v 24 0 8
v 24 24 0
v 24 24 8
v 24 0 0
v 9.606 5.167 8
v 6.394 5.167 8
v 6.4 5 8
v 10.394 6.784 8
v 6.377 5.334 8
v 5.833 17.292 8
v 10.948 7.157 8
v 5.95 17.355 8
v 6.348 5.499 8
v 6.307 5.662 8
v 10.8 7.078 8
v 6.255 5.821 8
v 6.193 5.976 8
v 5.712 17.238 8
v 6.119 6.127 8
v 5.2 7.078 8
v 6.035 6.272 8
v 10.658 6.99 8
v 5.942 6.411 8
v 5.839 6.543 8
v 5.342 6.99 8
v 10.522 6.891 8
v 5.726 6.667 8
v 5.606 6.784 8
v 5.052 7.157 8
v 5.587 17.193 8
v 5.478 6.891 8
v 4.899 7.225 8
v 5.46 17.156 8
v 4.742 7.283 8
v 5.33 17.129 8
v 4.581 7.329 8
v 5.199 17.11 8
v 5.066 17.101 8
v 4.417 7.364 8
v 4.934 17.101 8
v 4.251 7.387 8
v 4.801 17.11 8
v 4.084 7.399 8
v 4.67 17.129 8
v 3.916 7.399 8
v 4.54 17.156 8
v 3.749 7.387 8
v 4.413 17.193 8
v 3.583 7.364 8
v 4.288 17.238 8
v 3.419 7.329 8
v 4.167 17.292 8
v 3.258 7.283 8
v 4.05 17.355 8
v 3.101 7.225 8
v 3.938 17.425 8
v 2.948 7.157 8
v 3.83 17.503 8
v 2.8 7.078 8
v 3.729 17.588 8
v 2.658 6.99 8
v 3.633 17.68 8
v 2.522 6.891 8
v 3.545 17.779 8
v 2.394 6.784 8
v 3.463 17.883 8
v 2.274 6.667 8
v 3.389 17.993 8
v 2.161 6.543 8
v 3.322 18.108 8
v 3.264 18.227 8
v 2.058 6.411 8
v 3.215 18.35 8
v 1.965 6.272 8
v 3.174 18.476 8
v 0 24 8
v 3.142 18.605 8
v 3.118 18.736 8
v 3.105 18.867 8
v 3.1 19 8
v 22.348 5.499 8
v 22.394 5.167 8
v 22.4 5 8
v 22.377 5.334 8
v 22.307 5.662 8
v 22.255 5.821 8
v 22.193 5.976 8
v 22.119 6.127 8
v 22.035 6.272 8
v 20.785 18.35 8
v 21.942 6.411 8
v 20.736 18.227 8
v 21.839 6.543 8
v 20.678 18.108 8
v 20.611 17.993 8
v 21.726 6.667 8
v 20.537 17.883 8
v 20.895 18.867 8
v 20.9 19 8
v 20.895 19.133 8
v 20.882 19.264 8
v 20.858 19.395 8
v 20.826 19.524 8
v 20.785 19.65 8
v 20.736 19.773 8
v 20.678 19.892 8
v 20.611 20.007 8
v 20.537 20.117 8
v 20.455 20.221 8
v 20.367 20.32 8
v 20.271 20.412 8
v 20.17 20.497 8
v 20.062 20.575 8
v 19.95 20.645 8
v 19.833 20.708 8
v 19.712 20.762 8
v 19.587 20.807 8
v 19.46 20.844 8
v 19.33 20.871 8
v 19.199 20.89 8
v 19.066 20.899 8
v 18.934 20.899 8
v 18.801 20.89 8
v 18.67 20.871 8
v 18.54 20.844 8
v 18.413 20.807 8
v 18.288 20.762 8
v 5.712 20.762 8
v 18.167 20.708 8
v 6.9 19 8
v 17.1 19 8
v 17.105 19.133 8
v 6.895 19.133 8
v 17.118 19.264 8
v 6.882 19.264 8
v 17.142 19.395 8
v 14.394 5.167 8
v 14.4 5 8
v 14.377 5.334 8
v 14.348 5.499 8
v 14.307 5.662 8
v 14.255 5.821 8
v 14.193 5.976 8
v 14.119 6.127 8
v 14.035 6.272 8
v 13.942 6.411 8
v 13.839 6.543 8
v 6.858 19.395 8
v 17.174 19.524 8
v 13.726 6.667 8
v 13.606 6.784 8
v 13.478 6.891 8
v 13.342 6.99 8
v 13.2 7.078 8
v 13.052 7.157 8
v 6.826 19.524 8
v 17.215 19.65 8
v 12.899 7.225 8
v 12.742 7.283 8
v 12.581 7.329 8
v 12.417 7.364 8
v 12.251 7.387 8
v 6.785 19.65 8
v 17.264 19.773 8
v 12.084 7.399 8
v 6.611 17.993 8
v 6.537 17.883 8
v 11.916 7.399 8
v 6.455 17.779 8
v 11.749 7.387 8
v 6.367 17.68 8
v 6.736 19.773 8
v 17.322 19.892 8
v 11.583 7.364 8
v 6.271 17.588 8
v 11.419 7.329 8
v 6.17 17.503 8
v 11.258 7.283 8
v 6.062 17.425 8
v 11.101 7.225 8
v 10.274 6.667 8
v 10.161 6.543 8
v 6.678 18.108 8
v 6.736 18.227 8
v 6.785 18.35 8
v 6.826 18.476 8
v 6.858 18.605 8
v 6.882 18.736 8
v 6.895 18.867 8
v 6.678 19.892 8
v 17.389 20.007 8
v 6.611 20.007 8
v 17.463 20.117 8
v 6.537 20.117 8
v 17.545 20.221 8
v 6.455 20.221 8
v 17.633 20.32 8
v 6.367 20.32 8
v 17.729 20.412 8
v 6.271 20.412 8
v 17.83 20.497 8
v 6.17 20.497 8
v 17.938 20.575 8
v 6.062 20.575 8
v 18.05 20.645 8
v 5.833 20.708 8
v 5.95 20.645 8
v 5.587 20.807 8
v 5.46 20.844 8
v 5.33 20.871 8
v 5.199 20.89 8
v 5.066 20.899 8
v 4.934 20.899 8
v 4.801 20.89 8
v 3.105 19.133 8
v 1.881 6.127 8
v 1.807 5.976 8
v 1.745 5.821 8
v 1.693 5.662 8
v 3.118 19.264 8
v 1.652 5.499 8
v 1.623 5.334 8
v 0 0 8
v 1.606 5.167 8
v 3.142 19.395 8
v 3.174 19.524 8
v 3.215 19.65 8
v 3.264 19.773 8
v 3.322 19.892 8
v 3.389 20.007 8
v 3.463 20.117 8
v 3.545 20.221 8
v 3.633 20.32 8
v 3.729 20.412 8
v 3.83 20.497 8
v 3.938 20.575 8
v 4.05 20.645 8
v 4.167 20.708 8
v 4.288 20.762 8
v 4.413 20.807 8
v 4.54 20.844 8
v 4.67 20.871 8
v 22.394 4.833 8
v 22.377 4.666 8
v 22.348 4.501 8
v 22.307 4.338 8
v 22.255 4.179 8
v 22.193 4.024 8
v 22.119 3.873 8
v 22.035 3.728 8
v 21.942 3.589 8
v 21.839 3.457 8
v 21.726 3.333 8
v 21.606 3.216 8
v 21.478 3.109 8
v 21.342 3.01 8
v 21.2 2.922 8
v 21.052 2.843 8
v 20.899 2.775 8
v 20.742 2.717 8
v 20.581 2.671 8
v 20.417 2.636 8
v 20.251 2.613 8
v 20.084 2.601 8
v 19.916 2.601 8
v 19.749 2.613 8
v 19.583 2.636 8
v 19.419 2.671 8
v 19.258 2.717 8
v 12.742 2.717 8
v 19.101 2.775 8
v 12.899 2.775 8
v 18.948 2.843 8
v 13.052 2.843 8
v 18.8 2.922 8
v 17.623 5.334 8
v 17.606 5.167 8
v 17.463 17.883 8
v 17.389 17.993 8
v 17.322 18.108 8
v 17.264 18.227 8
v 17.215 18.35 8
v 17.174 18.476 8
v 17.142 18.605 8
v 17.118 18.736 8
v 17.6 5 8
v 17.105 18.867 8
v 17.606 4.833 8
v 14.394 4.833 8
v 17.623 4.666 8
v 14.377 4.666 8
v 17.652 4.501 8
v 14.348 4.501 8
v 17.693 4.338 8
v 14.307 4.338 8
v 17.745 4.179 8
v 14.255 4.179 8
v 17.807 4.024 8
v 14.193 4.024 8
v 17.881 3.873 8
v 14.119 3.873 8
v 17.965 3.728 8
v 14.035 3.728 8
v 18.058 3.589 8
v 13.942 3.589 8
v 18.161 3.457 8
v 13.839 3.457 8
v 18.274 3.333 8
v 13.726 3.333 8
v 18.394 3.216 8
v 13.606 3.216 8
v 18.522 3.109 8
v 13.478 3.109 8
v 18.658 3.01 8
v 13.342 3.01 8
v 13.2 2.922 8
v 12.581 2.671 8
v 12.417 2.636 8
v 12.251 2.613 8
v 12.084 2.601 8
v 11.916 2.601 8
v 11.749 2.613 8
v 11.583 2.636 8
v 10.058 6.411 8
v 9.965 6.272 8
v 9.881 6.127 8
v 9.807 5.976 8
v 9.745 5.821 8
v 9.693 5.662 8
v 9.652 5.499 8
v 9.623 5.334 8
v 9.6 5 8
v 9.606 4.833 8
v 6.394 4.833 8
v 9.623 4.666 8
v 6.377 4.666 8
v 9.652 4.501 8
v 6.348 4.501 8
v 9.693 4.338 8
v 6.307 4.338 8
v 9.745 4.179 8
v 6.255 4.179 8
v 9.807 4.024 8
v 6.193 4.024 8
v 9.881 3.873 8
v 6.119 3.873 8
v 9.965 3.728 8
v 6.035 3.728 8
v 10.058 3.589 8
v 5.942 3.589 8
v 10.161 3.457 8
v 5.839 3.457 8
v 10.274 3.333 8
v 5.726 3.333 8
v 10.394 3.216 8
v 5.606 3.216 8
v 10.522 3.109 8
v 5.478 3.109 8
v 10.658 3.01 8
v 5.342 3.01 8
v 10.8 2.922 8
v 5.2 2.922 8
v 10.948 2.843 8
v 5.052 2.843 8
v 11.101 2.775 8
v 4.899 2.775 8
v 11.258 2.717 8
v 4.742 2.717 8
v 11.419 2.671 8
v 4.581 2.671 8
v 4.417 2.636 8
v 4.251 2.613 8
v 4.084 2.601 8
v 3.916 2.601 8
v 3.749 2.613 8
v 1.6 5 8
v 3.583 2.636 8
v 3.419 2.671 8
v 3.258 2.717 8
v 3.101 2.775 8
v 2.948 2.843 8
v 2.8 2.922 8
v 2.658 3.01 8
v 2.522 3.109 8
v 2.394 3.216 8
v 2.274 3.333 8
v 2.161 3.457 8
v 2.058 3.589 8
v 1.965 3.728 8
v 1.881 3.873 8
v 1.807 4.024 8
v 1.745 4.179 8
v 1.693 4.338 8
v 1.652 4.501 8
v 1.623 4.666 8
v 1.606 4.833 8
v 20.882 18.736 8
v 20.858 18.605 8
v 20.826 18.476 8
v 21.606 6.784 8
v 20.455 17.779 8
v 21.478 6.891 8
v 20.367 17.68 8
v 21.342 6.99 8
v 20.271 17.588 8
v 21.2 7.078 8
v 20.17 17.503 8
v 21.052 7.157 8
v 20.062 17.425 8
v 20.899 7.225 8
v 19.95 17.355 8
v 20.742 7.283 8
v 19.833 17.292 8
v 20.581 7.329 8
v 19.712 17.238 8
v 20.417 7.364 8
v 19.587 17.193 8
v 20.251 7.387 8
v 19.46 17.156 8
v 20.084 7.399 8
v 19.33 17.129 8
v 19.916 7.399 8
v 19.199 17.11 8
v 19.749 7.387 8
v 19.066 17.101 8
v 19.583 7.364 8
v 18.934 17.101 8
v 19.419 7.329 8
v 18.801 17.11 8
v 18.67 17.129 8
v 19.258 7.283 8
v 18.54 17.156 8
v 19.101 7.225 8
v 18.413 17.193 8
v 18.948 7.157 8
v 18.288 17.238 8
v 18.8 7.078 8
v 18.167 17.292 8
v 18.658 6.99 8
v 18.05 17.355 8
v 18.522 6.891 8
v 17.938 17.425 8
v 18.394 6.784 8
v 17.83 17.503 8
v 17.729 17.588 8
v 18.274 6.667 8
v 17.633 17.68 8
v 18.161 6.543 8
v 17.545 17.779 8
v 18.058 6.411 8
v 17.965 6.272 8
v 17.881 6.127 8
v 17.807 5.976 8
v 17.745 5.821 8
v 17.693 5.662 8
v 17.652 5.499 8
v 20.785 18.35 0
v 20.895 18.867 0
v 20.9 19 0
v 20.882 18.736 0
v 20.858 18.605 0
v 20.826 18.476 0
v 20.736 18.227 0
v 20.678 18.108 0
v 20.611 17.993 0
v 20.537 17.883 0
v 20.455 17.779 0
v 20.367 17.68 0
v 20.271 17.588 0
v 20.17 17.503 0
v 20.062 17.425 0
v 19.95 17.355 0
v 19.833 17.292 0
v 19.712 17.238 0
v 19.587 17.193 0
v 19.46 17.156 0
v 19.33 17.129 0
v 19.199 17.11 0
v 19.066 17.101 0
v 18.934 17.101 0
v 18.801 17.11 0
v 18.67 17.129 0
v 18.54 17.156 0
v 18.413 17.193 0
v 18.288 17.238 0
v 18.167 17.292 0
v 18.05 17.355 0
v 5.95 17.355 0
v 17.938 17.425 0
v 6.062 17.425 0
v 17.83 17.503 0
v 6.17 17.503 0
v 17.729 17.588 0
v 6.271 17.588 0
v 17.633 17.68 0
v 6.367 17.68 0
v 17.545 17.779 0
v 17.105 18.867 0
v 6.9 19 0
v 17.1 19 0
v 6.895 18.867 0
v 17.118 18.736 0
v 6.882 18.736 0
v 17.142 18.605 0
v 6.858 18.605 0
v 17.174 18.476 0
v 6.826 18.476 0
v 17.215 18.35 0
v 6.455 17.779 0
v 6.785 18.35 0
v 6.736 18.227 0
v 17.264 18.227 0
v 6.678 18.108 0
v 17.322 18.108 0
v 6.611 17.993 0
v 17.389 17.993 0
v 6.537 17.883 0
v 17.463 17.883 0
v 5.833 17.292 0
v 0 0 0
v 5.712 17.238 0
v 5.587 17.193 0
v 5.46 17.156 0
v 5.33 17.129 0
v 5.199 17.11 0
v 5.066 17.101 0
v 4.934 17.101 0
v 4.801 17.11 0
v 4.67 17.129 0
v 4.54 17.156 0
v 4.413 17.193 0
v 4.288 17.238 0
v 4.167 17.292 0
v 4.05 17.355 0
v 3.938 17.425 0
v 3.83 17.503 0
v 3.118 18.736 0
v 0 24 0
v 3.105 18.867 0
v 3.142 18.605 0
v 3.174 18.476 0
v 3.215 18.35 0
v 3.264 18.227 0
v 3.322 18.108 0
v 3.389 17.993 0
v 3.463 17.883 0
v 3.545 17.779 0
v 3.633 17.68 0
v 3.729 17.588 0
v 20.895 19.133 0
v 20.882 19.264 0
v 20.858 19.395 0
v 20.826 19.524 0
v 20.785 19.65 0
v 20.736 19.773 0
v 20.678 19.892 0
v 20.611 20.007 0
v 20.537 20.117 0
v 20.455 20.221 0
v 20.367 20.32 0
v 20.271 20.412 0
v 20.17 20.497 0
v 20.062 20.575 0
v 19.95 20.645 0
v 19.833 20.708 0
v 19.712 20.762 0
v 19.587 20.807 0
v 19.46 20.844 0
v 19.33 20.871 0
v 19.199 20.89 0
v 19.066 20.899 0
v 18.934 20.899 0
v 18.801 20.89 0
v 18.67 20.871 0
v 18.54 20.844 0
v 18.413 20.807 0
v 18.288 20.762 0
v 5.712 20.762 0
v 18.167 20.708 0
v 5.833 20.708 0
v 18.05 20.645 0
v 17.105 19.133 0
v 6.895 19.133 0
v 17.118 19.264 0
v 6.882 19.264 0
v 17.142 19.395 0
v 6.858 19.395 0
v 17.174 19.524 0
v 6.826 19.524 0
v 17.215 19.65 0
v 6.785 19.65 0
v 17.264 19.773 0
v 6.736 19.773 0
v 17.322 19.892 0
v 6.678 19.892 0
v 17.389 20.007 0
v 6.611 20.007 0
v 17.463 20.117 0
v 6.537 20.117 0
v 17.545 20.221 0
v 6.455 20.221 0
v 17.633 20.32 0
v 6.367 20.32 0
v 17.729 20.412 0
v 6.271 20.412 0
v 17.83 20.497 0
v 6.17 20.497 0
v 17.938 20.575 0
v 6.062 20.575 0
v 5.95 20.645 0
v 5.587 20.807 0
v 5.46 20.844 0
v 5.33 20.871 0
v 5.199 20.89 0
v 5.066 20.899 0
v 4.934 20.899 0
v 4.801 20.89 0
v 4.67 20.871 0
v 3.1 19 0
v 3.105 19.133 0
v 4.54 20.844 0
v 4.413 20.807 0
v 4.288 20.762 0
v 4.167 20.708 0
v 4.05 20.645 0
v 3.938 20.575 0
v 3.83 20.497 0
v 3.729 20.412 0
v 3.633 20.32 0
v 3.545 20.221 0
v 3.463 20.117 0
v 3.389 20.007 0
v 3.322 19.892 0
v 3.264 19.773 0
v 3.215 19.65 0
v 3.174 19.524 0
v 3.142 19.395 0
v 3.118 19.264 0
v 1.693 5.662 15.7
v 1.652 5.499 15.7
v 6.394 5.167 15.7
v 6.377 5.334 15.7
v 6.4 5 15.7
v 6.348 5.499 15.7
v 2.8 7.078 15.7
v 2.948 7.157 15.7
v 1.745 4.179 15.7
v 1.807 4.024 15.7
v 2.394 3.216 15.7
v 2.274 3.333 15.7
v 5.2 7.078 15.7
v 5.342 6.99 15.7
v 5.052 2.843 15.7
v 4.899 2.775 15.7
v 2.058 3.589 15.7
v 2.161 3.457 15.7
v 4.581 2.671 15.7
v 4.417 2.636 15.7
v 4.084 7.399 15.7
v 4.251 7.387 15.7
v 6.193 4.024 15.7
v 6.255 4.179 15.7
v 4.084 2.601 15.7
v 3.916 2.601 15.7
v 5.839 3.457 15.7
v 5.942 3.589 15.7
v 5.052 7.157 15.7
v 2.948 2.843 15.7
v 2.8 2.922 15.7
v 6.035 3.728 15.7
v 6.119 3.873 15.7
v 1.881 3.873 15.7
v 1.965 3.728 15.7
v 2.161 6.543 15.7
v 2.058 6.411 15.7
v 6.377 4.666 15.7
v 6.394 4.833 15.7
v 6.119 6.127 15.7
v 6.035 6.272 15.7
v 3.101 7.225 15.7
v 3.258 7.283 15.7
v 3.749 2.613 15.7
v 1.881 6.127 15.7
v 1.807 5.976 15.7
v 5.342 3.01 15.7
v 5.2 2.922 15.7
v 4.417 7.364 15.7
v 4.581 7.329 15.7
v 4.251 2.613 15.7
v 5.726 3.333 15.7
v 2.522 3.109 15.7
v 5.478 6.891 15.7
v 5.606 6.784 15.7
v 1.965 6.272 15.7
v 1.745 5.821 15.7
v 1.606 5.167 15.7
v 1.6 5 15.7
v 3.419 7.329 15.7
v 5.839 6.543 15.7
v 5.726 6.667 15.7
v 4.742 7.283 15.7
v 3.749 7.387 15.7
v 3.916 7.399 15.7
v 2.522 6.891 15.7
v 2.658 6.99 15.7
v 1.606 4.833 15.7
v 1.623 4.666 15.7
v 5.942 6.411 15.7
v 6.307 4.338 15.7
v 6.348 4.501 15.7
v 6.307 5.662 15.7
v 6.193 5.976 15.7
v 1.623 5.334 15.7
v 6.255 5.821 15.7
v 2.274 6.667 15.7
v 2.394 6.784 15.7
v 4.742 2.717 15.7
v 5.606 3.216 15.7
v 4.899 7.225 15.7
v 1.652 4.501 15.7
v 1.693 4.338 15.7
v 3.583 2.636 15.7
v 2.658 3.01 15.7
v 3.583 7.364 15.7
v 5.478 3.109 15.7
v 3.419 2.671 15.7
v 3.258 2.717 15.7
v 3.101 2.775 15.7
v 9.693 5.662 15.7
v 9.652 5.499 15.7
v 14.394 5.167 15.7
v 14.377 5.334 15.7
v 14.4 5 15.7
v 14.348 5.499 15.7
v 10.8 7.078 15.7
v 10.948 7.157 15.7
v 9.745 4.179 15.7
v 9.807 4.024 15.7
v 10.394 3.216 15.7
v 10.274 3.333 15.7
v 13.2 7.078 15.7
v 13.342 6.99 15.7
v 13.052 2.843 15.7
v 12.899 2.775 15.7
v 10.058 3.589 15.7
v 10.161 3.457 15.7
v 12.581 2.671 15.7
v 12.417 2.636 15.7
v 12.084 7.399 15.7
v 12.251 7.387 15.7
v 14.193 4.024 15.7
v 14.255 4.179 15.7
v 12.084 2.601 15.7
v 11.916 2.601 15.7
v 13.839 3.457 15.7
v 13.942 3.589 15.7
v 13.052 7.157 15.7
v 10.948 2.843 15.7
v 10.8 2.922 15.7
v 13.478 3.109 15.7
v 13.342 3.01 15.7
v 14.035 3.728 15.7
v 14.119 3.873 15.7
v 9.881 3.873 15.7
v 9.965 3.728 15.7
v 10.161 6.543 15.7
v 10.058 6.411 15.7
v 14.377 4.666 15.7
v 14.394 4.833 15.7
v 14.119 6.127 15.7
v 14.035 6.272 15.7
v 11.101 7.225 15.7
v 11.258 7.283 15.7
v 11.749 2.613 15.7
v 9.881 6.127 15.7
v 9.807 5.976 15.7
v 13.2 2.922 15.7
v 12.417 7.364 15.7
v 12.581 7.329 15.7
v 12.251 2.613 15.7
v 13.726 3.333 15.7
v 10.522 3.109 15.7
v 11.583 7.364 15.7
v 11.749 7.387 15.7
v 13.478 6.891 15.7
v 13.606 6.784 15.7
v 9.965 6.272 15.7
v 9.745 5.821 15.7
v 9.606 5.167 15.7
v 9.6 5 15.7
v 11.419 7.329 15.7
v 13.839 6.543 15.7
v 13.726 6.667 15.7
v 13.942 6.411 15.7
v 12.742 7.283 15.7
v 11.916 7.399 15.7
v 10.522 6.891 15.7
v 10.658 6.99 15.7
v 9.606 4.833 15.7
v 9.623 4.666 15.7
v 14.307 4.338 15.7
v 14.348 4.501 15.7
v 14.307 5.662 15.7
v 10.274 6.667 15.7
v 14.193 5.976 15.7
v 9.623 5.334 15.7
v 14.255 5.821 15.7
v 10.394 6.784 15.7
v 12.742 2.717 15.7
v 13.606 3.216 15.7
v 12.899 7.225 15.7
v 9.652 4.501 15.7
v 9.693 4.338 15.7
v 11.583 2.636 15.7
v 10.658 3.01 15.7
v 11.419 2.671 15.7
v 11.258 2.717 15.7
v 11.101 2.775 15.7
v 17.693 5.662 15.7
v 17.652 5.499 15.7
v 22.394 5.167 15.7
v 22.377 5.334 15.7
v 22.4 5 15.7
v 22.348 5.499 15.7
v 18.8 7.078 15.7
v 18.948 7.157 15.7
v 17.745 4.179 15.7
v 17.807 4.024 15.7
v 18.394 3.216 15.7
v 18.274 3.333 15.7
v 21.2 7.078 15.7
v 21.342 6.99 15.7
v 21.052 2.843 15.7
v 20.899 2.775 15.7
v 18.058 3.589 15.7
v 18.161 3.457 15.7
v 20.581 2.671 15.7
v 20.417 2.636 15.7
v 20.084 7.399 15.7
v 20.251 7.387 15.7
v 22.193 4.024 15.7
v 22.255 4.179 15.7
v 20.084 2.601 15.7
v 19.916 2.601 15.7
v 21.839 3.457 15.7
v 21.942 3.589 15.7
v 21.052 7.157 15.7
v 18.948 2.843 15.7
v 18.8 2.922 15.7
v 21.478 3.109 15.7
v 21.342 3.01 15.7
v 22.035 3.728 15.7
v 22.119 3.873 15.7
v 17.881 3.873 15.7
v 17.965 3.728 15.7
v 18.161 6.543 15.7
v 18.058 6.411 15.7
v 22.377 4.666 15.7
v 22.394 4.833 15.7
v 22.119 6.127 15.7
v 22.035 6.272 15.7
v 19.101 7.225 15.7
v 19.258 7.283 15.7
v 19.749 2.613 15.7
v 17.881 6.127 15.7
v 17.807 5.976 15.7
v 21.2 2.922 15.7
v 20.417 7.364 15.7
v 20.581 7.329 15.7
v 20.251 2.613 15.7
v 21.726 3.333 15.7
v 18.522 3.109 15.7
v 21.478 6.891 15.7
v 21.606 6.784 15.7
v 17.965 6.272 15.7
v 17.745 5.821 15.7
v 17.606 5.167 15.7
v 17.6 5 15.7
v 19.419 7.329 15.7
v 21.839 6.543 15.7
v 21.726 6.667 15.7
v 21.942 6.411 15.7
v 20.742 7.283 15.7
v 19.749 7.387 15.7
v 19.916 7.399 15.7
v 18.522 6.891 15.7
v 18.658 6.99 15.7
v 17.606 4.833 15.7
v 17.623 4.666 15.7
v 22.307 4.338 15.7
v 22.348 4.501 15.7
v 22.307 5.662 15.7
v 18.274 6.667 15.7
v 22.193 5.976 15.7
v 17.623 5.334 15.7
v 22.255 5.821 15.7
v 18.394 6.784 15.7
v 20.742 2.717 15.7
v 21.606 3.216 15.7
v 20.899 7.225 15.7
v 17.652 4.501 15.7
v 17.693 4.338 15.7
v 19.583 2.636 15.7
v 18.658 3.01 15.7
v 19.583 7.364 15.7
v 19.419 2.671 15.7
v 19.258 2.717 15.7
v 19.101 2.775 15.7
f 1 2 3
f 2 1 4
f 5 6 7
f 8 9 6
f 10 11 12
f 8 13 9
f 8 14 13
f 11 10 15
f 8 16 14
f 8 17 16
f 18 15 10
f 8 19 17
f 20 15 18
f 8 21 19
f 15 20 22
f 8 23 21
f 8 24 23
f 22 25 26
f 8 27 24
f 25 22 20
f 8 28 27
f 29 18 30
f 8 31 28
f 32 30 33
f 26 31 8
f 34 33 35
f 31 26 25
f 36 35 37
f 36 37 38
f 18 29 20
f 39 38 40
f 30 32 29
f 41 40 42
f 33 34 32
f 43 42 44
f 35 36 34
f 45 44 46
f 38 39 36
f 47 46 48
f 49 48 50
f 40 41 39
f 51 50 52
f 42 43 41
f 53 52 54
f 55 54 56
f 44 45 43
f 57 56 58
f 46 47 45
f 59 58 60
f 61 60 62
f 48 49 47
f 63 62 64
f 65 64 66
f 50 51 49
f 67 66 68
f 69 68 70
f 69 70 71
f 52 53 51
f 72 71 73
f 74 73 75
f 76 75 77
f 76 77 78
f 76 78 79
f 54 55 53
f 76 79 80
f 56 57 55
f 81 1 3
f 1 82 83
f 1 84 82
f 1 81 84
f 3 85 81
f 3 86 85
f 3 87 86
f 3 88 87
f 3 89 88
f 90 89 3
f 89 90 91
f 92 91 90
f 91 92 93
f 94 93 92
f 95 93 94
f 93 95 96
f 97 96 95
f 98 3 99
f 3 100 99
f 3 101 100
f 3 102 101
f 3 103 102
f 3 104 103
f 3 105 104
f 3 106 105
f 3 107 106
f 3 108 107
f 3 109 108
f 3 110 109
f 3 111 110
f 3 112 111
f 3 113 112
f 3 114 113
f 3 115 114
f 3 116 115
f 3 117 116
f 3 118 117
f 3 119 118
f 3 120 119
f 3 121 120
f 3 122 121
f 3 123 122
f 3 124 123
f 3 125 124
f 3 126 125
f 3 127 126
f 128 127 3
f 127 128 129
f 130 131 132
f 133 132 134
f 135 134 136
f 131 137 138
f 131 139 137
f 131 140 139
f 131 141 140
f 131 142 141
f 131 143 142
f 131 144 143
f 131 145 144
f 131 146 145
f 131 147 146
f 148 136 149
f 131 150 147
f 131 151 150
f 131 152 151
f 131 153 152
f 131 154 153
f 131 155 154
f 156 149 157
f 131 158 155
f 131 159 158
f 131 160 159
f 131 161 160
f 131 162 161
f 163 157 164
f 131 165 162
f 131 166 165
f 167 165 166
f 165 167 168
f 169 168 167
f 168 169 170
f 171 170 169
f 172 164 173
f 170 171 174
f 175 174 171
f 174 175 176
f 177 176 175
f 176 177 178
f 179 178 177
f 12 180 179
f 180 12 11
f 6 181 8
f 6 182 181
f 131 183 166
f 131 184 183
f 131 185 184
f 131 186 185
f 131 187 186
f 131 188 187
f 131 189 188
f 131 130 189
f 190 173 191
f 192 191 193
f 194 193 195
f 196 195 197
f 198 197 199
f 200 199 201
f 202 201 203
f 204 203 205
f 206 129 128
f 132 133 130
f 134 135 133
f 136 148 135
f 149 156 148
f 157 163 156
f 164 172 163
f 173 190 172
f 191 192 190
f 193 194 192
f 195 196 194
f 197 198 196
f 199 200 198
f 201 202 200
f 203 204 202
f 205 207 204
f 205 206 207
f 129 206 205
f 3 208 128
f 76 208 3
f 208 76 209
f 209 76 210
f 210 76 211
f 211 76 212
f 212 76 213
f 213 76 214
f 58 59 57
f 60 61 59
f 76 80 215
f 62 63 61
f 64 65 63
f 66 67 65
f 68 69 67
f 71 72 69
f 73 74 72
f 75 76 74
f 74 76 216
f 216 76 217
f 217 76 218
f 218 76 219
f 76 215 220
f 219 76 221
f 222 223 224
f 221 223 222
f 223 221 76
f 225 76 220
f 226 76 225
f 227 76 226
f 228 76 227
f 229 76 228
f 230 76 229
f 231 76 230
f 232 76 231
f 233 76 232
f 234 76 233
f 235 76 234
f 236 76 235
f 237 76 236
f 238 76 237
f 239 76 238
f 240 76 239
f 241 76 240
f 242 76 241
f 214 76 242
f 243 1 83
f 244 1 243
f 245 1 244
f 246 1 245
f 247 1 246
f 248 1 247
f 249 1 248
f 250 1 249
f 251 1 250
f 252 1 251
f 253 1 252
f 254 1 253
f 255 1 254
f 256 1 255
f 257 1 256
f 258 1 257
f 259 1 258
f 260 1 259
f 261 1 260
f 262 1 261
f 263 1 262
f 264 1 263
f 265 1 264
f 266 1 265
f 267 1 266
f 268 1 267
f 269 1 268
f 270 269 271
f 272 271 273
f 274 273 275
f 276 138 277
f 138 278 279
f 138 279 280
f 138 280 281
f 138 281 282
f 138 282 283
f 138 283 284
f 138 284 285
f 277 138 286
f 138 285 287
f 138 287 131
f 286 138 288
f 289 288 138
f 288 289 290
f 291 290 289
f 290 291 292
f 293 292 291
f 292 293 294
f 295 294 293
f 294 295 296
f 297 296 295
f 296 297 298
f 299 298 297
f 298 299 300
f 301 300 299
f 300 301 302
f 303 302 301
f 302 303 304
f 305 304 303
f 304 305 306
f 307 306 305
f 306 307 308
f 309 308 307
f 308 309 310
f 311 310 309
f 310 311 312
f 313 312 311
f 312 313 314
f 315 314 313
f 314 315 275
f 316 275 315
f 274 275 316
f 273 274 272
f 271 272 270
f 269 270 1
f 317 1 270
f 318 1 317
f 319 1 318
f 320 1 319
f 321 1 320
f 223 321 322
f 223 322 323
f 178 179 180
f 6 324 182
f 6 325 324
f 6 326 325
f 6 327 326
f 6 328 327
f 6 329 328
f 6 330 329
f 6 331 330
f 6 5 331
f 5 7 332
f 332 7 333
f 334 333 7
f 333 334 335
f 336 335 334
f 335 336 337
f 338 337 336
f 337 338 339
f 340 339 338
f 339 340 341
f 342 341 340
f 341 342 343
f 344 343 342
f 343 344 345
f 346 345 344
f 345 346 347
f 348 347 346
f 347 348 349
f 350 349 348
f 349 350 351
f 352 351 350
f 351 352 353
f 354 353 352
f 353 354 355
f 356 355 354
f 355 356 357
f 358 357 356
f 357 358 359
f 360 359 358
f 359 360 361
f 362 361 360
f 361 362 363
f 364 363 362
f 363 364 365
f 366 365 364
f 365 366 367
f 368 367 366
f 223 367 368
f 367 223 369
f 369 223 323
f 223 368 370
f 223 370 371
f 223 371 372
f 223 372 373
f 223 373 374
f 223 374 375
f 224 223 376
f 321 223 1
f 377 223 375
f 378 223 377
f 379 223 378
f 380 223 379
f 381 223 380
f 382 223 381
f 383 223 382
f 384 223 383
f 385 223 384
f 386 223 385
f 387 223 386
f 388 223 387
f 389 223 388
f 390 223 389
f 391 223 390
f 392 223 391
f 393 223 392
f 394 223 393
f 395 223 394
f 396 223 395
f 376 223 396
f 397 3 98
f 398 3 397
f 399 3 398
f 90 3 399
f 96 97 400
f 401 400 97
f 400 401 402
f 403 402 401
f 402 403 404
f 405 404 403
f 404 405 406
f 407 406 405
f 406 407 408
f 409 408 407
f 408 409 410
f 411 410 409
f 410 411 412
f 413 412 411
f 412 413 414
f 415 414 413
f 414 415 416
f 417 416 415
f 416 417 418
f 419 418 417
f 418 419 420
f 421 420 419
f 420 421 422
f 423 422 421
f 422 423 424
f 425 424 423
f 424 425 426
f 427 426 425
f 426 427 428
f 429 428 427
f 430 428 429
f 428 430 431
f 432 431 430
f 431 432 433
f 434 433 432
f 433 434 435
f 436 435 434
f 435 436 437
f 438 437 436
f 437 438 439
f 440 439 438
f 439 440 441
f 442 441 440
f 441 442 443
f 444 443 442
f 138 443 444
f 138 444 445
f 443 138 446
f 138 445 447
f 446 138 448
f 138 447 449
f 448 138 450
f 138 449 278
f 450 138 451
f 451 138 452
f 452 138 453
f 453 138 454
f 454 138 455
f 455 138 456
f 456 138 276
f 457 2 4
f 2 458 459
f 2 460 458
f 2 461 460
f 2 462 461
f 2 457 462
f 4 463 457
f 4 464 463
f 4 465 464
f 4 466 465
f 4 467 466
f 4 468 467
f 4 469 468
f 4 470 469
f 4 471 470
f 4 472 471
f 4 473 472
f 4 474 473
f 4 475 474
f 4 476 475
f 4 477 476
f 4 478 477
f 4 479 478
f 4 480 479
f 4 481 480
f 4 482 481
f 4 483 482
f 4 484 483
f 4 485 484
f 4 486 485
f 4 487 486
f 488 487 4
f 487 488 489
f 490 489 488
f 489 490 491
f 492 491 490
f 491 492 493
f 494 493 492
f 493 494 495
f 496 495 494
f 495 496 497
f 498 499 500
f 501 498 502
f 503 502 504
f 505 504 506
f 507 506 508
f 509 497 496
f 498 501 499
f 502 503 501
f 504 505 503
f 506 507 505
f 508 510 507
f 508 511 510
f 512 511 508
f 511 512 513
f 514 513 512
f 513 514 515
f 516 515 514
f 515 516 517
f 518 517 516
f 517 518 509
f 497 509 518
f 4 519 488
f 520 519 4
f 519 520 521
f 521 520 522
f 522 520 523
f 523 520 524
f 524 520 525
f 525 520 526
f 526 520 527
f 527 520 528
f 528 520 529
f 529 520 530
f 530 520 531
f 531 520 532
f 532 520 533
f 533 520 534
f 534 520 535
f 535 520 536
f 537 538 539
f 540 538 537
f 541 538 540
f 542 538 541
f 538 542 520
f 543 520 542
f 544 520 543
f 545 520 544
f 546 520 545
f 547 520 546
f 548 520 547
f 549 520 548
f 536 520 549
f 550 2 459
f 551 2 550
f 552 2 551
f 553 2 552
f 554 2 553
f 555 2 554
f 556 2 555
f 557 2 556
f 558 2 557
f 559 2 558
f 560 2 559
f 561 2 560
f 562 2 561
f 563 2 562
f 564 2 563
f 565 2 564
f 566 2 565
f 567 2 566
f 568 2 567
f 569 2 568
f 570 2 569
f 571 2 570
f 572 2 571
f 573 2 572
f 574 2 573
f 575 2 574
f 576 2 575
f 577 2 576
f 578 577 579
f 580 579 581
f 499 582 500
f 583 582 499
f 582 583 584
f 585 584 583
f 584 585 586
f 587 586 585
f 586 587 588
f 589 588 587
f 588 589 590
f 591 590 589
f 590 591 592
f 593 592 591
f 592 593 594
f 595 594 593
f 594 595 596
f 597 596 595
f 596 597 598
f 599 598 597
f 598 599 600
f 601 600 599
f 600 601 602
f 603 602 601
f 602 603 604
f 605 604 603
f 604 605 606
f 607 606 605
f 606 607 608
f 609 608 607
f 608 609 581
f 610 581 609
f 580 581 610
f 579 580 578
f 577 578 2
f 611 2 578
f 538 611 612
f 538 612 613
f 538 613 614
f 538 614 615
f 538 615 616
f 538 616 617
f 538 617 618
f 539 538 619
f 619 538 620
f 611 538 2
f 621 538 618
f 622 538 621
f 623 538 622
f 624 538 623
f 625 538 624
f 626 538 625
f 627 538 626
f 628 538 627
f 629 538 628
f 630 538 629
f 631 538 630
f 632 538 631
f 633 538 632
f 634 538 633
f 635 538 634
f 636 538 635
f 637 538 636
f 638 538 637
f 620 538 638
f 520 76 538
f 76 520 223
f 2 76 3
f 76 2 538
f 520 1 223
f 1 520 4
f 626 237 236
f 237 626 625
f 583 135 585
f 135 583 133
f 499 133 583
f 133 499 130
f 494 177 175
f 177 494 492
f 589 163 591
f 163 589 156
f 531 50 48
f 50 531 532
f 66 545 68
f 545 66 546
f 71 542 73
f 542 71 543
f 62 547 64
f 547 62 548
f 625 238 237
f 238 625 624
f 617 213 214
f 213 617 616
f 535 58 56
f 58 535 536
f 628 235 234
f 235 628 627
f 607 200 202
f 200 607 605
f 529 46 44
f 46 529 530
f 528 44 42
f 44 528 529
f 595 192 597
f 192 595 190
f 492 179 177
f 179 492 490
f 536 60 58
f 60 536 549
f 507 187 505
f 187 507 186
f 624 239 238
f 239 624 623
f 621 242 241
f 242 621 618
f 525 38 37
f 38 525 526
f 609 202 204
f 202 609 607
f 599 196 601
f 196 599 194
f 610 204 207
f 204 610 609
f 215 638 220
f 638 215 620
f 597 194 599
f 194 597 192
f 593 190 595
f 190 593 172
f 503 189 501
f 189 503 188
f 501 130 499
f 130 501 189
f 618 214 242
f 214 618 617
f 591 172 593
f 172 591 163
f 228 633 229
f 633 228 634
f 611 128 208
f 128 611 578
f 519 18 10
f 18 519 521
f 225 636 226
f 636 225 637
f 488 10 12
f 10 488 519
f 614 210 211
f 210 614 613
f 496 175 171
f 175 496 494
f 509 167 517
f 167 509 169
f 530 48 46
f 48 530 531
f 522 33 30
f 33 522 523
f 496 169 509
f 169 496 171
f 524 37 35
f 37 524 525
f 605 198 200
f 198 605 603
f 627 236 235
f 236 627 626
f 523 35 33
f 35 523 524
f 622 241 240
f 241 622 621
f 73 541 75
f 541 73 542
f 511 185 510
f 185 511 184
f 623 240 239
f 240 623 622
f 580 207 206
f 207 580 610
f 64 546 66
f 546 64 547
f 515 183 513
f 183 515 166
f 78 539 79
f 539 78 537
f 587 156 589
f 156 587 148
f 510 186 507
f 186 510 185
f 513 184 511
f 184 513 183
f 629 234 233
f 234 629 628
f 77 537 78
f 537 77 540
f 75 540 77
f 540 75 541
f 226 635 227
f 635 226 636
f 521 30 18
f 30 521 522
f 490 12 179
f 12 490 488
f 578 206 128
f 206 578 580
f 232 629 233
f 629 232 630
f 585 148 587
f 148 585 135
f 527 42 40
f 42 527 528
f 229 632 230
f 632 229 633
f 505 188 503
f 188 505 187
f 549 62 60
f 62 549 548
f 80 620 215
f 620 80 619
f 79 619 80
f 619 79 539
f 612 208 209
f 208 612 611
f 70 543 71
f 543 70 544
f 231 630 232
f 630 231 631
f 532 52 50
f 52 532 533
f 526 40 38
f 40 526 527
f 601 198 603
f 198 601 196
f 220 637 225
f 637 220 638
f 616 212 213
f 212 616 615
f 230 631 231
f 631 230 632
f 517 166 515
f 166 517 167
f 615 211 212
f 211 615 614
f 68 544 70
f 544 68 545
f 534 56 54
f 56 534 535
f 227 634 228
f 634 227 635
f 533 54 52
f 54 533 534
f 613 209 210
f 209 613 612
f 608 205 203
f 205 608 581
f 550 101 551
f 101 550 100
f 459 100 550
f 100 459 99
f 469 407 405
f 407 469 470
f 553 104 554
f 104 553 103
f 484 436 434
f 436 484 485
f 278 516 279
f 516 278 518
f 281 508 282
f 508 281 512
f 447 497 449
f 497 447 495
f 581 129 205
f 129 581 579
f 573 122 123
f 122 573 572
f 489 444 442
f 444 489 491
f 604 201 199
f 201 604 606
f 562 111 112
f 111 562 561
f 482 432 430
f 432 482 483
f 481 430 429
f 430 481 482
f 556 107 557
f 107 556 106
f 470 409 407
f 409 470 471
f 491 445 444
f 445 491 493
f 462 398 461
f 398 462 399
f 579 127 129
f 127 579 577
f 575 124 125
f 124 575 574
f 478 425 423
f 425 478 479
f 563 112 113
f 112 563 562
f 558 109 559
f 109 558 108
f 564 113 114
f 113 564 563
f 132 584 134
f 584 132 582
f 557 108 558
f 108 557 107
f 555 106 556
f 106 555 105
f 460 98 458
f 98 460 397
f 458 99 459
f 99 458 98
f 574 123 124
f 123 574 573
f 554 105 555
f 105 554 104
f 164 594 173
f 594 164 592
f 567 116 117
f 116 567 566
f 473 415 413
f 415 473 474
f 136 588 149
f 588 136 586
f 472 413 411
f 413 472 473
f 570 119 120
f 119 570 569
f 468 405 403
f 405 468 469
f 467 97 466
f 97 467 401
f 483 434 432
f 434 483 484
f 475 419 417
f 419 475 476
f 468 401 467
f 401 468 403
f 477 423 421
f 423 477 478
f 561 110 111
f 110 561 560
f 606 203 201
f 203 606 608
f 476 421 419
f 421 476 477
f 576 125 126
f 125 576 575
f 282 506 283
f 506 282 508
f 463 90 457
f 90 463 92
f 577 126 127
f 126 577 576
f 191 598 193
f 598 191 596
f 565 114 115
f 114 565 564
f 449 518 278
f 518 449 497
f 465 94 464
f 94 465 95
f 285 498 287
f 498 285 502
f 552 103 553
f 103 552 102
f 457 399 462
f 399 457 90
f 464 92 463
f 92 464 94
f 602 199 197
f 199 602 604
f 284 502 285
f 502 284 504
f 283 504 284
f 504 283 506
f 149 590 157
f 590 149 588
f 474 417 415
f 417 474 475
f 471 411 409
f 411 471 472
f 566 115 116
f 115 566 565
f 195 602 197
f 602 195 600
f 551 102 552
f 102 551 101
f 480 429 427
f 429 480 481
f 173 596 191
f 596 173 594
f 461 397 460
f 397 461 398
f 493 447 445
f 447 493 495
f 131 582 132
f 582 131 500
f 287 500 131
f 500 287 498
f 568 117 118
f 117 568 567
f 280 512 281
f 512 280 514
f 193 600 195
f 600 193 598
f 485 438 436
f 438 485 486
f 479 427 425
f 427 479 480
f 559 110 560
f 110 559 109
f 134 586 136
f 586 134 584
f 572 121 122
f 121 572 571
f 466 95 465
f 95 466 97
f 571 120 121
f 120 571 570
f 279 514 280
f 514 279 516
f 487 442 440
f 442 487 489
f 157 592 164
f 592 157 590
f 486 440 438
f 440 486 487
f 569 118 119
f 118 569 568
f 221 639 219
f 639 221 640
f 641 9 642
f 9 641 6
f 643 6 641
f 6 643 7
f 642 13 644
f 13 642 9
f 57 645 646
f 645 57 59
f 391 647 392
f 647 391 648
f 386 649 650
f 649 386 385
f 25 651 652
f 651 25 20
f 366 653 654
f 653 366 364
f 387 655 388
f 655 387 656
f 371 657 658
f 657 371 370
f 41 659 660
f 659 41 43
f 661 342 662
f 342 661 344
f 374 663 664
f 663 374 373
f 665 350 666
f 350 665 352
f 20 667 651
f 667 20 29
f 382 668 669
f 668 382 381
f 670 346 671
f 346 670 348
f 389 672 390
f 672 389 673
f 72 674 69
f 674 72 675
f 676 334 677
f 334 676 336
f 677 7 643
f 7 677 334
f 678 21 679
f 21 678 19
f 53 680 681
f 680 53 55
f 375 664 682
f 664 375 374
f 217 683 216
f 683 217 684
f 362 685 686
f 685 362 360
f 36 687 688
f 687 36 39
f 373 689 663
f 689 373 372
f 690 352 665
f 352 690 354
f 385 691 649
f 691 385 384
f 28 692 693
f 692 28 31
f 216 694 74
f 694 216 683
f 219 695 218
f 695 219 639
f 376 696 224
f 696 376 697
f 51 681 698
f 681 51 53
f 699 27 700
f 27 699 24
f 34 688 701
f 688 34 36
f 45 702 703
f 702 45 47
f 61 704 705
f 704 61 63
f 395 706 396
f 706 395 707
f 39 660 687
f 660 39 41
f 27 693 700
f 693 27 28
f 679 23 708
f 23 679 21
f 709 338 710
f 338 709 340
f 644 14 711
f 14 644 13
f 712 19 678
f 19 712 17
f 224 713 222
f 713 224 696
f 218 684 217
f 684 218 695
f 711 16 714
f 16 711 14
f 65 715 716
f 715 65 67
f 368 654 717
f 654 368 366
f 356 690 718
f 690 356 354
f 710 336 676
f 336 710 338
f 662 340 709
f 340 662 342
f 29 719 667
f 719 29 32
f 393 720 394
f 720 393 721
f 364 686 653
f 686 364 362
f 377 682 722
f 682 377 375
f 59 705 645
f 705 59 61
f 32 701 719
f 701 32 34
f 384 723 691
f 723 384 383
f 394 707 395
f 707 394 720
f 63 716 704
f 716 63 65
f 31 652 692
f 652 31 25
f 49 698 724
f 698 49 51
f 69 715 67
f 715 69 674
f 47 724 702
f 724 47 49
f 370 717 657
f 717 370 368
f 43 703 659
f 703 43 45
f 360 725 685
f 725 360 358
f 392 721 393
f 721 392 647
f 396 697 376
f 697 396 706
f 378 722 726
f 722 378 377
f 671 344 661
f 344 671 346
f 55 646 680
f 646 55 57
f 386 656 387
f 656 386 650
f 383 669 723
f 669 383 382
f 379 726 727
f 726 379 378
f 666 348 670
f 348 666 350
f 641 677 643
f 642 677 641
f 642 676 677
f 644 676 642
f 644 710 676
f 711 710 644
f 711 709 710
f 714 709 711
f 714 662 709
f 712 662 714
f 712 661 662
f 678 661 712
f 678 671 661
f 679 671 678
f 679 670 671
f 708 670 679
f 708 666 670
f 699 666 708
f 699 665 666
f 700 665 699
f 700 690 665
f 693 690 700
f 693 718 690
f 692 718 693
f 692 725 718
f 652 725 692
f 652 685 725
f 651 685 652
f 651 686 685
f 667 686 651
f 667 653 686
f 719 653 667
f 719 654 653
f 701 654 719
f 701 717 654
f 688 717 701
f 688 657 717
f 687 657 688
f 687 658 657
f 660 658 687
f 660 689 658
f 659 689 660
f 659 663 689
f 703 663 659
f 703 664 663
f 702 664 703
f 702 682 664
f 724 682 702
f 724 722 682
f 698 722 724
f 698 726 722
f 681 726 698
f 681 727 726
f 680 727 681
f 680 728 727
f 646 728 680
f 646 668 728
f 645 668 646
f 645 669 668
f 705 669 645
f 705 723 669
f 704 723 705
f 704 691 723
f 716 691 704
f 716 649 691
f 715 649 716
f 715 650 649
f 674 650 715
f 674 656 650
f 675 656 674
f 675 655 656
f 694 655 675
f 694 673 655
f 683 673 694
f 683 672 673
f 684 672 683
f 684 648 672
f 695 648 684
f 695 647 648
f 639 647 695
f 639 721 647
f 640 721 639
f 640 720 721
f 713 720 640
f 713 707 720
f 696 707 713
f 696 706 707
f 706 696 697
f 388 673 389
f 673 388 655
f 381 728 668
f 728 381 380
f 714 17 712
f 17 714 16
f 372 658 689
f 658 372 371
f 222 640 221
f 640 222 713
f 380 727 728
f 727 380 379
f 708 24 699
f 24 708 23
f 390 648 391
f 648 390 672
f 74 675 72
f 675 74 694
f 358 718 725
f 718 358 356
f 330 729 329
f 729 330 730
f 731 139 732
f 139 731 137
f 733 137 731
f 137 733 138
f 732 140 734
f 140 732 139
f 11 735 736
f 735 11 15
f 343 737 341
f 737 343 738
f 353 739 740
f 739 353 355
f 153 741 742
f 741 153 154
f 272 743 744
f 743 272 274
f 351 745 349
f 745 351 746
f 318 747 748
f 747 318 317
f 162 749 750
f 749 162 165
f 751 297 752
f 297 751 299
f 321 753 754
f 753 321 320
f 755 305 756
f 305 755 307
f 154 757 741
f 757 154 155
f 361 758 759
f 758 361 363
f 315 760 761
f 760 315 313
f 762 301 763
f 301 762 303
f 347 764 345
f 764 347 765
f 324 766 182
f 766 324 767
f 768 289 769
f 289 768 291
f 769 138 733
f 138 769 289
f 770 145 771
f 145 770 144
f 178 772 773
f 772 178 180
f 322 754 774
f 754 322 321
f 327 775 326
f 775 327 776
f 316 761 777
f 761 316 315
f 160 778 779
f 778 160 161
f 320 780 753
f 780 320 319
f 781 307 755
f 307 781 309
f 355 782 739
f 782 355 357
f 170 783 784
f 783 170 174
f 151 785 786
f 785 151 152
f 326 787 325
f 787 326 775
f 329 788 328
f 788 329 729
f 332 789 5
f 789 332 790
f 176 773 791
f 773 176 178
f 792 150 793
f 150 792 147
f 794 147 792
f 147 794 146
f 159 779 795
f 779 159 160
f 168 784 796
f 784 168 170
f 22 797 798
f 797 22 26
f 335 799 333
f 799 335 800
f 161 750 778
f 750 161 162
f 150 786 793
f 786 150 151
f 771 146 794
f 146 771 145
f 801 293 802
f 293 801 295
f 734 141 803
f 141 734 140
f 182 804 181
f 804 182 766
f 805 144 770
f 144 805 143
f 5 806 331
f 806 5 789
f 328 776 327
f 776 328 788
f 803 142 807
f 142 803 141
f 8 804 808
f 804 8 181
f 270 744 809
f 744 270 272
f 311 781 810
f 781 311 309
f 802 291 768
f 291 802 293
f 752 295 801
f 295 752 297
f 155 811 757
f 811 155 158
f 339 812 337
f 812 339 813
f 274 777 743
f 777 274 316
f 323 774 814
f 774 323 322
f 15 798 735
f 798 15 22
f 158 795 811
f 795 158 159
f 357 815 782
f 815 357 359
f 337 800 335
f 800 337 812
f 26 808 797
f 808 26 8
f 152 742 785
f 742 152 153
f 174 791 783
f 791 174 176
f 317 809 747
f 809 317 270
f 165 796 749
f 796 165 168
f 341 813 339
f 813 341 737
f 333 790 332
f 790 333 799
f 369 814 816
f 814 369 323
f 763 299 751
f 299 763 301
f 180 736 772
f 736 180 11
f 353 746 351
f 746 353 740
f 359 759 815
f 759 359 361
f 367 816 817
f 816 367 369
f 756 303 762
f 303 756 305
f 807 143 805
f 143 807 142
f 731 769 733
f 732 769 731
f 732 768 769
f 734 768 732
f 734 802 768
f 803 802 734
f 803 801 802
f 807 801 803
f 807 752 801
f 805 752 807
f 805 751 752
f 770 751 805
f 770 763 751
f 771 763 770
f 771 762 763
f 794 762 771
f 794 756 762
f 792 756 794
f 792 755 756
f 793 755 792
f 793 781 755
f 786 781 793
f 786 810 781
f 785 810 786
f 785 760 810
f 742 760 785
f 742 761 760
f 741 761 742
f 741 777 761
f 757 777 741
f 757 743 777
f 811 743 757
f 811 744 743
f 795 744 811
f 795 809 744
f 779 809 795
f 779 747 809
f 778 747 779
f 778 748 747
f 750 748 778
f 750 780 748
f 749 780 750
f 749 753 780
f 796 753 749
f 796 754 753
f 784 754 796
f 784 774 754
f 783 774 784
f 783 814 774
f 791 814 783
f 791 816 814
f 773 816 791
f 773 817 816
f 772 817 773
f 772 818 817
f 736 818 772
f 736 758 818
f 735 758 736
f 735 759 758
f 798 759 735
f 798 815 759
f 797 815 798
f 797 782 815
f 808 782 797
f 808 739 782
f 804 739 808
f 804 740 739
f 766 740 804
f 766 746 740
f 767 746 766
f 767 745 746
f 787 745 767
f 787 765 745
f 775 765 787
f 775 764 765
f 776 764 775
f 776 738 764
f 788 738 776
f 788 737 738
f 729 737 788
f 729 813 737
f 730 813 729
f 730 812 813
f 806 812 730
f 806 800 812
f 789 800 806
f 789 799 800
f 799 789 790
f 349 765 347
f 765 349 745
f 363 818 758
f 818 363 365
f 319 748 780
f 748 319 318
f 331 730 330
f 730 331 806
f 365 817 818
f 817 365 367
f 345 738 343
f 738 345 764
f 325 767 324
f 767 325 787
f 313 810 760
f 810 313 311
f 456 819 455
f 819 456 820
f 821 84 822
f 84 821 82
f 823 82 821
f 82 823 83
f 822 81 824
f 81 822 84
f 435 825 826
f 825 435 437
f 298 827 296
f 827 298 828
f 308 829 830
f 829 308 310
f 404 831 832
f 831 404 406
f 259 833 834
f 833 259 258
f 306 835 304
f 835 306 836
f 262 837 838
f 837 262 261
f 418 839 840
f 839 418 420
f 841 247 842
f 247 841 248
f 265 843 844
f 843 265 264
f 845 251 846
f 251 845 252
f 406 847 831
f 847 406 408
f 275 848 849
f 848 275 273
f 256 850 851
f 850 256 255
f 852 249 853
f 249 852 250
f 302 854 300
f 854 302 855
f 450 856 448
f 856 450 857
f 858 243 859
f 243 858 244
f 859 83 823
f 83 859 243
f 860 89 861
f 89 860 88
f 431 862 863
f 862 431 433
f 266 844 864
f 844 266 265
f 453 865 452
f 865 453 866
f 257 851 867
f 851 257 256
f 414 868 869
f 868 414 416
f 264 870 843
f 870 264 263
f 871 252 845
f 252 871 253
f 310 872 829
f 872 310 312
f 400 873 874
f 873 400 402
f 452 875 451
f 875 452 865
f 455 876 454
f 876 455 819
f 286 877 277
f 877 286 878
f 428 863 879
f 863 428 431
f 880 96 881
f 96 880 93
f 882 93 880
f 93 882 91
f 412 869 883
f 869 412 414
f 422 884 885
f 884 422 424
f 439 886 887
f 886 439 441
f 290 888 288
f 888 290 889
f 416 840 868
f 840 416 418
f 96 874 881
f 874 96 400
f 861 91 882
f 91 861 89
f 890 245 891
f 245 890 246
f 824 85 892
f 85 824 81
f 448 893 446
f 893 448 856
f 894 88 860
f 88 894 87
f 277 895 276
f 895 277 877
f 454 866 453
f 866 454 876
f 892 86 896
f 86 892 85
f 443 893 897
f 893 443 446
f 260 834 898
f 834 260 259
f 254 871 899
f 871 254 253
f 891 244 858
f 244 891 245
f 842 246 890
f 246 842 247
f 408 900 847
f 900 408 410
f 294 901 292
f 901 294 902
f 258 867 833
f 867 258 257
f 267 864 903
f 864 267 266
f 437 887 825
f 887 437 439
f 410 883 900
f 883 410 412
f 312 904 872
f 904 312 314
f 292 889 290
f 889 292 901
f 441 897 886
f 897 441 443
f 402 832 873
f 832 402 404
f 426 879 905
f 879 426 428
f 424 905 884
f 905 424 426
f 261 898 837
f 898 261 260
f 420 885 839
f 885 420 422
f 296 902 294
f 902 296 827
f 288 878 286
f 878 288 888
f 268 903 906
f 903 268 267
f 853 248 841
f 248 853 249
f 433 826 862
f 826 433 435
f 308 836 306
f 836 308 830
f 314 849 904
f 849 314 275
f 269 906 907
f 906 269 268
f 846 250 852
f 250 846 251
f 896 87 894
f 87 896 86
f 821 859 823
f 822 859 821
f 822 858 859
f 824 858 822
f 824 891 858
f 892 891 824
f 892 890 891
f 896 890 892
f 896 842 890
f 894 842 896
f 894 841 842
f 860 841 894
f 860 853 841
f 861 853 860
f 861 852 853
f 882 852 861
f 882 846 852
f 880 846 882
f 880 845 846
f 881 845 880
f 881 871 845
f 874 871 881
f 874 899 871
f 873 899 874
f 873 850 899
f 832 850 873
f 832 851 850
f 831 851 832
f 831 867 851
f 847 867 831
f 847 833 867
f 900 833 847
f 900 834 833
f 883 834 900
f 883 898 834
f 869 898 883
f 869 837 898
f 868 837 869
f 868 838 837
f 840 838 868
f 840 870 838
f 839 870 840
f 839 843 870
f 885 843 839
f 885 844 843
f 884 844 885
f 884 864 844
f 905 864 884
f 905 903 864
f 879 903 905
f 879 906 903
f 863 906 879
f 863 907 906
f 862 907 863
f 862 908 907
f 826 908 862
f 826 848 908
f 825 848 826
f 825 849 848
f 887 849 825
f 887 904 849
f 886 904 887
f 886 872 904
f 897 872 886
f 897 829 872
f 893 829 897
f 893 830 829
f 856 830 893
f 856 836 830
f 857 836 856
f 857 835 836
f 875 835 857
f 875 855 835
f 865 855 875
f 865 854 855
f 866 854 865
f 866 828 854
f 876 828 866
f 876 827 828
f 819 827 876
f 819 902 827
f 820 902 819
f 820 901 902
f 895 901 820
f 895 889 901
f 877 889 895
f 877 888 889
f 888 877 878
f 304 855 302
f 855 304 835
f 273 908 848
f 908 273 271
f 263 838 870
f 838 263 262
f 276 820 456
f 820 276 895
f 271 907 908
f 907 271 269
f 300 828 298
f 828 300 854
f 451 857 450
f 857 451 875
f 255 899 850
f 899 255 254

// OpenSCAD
$fn=90;

cubeThickness = 8;
cubeSideLength = 24;

difference(){
	cube([cubeSideLength, cubeSideLength, cubeThickness]);
	holeDiameter = 3.8;
	holeBorderDistance = 5;
	#translate([holeBorderDistance, cubeSideLength-holeBorderDistance, -0.5])
		cylinder(h=cubeThickness+1, d=holeDiameter);
	#translate([cubeSideLength-holeBorderDistance, cubeSideLength-holeBorderDistance, -0.5])
		cylinder(h=cubeThickness+1, d=holeDiameter);
}

rodDiameter = 4.8;
rodLength = 7.7;
rodDistance = 8;

translate([0, 5, cubeThickness]){
	numberOfRods = 3;
	firstRodX = (cubeSideLength - (numberOfRods-1)*rodDistance)/2;
	translate([firstRodX, 0, 0])
		cylinder(h=rodLength, d=rodDiameter);
	translate([firstRodX+rodDistance, 0, 0])
		cylinder(h=rodLength, d=rodDiameter);
	translate([firstRodX+2*rodDistance, 0, 0])
		cylinder(h=rodLength, d=rodDiameter);
}
